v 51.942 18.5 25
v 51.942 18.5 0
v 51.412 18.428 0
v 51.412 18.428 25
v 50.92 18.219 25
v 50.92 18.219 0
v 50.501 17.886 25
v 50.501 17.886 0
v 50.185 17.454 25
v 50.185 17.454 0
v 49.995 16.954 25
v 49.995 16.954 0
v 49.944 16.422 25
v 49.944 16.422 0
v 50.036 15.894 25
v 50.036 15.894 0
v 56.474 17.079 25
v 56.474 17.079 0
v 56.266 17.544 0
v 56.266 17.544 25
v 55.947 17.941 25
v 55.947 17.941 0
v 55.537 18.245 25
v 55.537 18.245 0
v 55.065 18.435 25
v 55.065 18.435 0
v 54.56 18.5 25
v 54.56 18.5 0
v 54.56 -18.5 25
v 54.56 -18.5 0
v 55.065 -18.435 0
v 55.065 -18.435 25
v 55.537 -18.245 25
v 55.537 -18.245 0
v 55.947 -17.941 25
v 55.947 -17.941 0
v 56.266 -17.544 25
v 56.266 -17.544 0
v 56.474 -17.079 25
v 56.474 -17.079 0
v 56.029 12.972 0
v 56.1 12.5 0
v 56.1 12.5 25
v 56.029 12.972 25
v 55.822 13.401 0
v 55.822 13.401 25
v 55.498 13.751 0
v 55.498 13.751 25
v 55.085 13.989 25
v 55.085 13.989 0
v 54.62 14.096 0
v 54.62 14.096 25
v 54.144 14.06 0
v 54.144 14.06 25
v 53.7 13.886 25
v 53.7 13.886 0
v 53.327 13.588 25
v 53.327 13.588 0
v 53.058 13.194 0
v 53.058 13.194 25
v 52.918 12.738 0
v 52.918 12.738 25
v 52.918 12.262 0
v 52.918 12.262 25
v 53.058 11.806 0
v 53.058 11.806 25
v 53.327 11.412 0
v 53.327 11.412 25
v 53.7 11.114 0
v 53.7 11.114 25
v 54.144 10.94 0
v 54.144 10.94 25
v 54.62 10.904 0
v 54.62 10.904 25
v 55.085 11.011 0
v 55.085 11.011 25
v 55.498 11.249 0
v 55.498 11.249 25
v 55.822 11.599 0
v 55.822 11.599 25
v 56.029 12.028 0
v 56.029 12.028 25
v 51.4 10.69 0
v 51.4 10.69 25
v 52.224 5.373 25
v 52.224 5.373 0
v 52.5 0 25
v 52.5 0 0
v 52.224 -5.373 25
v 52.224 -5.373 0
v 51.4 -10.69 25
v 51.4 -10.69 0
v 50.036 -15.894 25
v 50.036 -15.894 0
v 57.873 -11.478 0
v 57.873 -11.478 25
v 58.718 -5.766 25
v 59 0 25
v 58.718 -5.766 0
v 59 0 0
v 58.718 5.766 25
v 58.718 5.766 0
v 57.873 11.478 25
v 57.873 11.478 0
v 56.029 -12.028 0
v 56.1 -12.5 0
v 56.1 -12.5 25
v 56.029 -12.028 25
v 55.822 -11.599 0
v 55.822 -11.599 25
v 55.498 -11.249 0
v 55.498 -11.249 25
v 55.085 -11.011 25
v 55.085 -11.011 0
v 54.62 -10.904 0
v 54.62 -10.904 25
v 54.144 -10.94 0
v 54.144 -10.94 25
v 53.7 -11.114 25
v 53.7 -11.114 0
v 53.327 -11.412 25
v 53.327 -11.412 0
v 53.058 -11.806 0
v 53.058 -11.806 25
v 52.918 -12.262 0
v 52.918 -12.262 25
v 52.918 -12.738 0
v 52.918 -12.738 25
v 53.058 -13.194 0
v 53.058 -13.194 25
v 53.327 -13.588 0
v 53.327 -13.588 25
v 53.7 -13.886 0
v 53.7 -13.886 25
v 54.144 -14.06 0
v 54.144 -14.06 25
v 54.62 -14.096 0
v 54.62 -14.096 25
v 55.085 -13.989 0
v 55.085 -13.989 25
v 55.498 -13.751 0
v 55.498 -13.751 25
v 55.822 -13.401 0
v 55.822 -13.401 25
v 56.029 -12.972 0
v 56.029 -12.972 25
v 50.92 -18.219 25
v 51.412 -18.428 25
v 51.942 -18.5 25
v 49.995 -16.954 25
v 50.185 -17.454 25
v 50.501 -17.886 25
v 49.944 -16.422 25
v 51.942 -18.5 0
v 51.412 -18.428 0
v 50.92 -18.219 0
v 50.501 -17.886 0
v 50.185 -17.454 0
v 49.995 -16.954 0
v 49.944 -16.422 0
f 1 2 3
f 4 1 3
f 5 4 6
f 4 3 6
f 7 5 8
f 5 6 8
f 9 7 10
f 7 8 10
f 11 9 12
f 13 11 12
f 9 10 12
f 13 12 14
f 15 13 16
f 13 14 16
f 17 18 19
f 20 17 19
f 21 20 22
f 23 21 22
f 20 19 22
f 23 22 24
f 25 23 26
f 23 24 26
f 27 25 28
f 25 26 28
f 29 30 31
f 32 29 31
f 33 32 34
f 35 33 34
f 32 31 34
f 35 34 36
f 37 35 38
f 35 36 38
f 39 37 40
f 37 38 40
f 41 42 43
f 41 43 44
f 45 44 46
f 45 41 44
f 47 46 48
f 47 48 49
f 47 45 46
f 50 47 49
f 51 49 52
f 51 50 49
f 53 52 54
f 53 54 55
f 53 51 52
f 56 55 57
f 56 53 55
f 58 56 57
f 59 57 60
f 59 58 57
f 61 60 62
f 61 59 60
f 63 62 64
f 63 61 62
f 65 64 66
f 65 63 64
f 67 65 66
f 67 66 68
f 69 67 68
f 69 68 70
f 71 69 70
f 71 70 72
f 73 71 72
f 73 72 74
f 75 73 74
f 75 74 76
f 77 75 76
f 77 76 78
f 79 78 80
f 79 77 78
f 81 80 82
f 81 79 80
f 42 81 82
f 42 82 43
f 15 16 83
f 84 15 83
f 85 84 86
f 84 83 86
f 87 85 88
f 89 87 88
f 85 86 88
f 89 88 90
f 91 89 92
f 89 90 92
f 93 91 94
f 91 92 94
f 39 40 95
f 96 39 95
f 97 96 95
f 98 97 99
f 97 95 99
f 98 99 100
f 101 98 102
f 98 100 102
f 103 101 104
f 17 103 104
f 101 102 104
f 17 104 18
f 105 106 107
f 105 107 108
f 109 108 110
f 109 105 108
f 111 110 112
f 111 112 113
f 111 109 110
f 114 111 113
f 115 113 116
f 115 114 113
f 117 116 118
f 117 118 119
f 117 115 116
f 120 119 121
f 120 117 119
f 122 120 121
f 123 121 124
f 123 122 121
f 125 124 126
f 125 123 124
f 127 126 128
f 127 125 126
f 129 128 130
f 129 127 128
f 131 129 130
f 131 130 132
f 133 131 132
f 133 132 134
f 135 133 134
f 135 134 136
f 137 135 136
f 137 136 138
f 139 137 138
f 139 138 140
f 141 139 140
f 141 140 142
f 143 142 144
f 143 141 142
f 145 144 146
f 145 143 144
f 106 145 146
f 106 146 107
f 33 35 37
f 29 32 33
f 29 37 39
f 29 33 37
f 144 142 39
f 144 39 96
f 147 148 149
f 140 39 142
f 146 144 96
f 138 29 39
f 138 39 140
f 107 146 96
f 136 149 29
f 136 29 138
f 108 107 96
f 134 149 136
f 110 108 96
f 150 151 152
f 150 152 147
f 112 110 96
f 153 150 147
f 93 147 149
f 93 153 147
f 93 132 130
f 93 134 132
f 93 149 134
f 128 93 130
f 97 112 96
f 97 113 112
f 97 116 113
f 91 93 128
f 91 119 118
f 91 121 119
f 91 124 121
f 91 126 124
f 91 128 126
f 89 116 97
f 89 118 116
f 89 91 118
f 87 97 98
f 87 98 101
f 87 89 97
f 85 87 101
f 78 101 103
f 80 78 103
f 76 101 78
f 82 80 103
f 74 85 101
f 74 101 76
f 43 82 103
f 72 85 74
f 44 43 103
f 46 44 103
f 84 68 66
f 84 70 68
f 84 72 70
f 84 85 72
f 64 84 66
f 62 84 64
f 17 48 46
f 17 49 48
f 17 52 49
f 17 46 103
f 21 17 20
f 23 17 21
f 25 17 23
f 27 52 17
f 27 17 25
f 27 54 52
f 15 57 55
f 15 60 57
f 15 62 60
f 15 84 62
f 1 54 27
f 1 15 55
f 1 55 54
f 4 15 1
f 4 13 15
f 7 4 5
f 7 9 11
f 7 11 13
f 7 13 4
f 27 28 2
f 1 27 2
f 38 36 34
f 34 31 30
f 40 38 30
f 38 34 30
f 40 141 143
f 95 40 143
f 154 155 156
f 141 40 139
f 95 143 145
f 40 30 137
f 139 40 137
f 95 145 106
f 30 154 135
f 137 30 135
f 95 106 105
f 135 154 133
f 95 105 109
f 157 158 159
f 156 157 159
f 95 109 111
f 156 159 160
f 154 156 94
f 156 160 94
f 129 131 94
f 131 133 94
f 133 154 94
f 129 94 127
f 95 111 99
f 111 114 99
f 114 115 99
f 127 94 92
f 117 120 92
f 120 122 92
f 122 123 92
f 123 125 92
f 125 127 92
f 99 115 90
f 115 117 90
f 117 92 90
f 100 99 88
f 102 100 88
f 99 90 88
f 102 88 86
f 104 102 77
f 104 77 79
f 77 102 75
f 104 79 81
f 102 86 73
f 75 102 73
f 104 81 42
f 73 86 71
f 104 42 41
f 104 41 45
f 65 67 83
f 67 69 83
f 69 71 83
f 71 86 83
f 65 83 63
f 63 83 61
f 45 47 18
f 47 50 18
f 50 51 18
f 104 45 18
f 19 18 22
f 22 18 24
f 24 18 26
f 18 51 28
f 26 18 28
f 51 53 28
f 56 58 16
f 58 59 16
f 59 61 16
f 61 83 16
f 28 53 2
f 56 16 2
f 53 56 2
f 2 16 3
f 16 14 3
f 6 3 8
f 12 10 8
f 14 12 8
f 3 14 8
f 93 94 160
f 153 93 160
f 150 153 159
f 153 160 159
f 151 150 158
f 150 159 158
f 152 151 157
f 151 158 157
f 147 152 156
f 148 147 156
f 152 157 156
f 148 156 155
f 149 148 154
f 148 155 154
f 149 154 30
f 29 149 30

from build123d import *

# Parameters (mm, degrees)
SKETCH1_R           = 1.6
BOSS_EXTRUDE1_DEPTH = 25


with BuildPart() as part:
    # Sketch1 → Boss-Extrude1 (new body)
    with BuildSketch(Plane(origin=(0, 0, 0), x_dir=(0, 1, 0), z_dir=(0, 0, 1))):
        with BuildLine():
            Line((-18.5, -51.942275653), (-18.5, -54.559600438))
            ThreePointArc((-18.5, -54.559600438), (-18.105910137, -55.75167956), (-17.078947368, -56.473972384))
            ThreePointArc((-17.078947368, -56.473972384), (0, -59), (17.078947368, -56.473972384))
            ThreePointArc((17.078947368, -56.473972384), (18.105910137, -55.75167956), (18.5, -54.559600438))
            Line((18.5, -54.559600438), (18.5, -51.942275653))
            ThreePointArc((18.5, -51.942275653), (17.680887553, -50.328118106), (15.894495413, -50.036137097))
            ThreePointArc((15.894495413, -50.036137097), (0, -52.5), (-15.894495413, -50.036137097))
            ThreePointArc((-15.894495413, -50.036137097), (-17.680887553, -50.328118106), (-18.5, -51.942275653))
        make_face()
        with Locations(Location((-12.5, -54.5, 0), (0, 0, 270))):
            Circle(SKETCH1_R, mode=Mode.SUBTRACT)
        with Locations(Location((12.5, -54.5, 0), (0, 0, 270))):
            Circle(SKETCH1_R, mode=Mode.SUBTRACT)
    extrude(amount=BOSS_EXTRUDE1_DEPTH)


solid = part.part
